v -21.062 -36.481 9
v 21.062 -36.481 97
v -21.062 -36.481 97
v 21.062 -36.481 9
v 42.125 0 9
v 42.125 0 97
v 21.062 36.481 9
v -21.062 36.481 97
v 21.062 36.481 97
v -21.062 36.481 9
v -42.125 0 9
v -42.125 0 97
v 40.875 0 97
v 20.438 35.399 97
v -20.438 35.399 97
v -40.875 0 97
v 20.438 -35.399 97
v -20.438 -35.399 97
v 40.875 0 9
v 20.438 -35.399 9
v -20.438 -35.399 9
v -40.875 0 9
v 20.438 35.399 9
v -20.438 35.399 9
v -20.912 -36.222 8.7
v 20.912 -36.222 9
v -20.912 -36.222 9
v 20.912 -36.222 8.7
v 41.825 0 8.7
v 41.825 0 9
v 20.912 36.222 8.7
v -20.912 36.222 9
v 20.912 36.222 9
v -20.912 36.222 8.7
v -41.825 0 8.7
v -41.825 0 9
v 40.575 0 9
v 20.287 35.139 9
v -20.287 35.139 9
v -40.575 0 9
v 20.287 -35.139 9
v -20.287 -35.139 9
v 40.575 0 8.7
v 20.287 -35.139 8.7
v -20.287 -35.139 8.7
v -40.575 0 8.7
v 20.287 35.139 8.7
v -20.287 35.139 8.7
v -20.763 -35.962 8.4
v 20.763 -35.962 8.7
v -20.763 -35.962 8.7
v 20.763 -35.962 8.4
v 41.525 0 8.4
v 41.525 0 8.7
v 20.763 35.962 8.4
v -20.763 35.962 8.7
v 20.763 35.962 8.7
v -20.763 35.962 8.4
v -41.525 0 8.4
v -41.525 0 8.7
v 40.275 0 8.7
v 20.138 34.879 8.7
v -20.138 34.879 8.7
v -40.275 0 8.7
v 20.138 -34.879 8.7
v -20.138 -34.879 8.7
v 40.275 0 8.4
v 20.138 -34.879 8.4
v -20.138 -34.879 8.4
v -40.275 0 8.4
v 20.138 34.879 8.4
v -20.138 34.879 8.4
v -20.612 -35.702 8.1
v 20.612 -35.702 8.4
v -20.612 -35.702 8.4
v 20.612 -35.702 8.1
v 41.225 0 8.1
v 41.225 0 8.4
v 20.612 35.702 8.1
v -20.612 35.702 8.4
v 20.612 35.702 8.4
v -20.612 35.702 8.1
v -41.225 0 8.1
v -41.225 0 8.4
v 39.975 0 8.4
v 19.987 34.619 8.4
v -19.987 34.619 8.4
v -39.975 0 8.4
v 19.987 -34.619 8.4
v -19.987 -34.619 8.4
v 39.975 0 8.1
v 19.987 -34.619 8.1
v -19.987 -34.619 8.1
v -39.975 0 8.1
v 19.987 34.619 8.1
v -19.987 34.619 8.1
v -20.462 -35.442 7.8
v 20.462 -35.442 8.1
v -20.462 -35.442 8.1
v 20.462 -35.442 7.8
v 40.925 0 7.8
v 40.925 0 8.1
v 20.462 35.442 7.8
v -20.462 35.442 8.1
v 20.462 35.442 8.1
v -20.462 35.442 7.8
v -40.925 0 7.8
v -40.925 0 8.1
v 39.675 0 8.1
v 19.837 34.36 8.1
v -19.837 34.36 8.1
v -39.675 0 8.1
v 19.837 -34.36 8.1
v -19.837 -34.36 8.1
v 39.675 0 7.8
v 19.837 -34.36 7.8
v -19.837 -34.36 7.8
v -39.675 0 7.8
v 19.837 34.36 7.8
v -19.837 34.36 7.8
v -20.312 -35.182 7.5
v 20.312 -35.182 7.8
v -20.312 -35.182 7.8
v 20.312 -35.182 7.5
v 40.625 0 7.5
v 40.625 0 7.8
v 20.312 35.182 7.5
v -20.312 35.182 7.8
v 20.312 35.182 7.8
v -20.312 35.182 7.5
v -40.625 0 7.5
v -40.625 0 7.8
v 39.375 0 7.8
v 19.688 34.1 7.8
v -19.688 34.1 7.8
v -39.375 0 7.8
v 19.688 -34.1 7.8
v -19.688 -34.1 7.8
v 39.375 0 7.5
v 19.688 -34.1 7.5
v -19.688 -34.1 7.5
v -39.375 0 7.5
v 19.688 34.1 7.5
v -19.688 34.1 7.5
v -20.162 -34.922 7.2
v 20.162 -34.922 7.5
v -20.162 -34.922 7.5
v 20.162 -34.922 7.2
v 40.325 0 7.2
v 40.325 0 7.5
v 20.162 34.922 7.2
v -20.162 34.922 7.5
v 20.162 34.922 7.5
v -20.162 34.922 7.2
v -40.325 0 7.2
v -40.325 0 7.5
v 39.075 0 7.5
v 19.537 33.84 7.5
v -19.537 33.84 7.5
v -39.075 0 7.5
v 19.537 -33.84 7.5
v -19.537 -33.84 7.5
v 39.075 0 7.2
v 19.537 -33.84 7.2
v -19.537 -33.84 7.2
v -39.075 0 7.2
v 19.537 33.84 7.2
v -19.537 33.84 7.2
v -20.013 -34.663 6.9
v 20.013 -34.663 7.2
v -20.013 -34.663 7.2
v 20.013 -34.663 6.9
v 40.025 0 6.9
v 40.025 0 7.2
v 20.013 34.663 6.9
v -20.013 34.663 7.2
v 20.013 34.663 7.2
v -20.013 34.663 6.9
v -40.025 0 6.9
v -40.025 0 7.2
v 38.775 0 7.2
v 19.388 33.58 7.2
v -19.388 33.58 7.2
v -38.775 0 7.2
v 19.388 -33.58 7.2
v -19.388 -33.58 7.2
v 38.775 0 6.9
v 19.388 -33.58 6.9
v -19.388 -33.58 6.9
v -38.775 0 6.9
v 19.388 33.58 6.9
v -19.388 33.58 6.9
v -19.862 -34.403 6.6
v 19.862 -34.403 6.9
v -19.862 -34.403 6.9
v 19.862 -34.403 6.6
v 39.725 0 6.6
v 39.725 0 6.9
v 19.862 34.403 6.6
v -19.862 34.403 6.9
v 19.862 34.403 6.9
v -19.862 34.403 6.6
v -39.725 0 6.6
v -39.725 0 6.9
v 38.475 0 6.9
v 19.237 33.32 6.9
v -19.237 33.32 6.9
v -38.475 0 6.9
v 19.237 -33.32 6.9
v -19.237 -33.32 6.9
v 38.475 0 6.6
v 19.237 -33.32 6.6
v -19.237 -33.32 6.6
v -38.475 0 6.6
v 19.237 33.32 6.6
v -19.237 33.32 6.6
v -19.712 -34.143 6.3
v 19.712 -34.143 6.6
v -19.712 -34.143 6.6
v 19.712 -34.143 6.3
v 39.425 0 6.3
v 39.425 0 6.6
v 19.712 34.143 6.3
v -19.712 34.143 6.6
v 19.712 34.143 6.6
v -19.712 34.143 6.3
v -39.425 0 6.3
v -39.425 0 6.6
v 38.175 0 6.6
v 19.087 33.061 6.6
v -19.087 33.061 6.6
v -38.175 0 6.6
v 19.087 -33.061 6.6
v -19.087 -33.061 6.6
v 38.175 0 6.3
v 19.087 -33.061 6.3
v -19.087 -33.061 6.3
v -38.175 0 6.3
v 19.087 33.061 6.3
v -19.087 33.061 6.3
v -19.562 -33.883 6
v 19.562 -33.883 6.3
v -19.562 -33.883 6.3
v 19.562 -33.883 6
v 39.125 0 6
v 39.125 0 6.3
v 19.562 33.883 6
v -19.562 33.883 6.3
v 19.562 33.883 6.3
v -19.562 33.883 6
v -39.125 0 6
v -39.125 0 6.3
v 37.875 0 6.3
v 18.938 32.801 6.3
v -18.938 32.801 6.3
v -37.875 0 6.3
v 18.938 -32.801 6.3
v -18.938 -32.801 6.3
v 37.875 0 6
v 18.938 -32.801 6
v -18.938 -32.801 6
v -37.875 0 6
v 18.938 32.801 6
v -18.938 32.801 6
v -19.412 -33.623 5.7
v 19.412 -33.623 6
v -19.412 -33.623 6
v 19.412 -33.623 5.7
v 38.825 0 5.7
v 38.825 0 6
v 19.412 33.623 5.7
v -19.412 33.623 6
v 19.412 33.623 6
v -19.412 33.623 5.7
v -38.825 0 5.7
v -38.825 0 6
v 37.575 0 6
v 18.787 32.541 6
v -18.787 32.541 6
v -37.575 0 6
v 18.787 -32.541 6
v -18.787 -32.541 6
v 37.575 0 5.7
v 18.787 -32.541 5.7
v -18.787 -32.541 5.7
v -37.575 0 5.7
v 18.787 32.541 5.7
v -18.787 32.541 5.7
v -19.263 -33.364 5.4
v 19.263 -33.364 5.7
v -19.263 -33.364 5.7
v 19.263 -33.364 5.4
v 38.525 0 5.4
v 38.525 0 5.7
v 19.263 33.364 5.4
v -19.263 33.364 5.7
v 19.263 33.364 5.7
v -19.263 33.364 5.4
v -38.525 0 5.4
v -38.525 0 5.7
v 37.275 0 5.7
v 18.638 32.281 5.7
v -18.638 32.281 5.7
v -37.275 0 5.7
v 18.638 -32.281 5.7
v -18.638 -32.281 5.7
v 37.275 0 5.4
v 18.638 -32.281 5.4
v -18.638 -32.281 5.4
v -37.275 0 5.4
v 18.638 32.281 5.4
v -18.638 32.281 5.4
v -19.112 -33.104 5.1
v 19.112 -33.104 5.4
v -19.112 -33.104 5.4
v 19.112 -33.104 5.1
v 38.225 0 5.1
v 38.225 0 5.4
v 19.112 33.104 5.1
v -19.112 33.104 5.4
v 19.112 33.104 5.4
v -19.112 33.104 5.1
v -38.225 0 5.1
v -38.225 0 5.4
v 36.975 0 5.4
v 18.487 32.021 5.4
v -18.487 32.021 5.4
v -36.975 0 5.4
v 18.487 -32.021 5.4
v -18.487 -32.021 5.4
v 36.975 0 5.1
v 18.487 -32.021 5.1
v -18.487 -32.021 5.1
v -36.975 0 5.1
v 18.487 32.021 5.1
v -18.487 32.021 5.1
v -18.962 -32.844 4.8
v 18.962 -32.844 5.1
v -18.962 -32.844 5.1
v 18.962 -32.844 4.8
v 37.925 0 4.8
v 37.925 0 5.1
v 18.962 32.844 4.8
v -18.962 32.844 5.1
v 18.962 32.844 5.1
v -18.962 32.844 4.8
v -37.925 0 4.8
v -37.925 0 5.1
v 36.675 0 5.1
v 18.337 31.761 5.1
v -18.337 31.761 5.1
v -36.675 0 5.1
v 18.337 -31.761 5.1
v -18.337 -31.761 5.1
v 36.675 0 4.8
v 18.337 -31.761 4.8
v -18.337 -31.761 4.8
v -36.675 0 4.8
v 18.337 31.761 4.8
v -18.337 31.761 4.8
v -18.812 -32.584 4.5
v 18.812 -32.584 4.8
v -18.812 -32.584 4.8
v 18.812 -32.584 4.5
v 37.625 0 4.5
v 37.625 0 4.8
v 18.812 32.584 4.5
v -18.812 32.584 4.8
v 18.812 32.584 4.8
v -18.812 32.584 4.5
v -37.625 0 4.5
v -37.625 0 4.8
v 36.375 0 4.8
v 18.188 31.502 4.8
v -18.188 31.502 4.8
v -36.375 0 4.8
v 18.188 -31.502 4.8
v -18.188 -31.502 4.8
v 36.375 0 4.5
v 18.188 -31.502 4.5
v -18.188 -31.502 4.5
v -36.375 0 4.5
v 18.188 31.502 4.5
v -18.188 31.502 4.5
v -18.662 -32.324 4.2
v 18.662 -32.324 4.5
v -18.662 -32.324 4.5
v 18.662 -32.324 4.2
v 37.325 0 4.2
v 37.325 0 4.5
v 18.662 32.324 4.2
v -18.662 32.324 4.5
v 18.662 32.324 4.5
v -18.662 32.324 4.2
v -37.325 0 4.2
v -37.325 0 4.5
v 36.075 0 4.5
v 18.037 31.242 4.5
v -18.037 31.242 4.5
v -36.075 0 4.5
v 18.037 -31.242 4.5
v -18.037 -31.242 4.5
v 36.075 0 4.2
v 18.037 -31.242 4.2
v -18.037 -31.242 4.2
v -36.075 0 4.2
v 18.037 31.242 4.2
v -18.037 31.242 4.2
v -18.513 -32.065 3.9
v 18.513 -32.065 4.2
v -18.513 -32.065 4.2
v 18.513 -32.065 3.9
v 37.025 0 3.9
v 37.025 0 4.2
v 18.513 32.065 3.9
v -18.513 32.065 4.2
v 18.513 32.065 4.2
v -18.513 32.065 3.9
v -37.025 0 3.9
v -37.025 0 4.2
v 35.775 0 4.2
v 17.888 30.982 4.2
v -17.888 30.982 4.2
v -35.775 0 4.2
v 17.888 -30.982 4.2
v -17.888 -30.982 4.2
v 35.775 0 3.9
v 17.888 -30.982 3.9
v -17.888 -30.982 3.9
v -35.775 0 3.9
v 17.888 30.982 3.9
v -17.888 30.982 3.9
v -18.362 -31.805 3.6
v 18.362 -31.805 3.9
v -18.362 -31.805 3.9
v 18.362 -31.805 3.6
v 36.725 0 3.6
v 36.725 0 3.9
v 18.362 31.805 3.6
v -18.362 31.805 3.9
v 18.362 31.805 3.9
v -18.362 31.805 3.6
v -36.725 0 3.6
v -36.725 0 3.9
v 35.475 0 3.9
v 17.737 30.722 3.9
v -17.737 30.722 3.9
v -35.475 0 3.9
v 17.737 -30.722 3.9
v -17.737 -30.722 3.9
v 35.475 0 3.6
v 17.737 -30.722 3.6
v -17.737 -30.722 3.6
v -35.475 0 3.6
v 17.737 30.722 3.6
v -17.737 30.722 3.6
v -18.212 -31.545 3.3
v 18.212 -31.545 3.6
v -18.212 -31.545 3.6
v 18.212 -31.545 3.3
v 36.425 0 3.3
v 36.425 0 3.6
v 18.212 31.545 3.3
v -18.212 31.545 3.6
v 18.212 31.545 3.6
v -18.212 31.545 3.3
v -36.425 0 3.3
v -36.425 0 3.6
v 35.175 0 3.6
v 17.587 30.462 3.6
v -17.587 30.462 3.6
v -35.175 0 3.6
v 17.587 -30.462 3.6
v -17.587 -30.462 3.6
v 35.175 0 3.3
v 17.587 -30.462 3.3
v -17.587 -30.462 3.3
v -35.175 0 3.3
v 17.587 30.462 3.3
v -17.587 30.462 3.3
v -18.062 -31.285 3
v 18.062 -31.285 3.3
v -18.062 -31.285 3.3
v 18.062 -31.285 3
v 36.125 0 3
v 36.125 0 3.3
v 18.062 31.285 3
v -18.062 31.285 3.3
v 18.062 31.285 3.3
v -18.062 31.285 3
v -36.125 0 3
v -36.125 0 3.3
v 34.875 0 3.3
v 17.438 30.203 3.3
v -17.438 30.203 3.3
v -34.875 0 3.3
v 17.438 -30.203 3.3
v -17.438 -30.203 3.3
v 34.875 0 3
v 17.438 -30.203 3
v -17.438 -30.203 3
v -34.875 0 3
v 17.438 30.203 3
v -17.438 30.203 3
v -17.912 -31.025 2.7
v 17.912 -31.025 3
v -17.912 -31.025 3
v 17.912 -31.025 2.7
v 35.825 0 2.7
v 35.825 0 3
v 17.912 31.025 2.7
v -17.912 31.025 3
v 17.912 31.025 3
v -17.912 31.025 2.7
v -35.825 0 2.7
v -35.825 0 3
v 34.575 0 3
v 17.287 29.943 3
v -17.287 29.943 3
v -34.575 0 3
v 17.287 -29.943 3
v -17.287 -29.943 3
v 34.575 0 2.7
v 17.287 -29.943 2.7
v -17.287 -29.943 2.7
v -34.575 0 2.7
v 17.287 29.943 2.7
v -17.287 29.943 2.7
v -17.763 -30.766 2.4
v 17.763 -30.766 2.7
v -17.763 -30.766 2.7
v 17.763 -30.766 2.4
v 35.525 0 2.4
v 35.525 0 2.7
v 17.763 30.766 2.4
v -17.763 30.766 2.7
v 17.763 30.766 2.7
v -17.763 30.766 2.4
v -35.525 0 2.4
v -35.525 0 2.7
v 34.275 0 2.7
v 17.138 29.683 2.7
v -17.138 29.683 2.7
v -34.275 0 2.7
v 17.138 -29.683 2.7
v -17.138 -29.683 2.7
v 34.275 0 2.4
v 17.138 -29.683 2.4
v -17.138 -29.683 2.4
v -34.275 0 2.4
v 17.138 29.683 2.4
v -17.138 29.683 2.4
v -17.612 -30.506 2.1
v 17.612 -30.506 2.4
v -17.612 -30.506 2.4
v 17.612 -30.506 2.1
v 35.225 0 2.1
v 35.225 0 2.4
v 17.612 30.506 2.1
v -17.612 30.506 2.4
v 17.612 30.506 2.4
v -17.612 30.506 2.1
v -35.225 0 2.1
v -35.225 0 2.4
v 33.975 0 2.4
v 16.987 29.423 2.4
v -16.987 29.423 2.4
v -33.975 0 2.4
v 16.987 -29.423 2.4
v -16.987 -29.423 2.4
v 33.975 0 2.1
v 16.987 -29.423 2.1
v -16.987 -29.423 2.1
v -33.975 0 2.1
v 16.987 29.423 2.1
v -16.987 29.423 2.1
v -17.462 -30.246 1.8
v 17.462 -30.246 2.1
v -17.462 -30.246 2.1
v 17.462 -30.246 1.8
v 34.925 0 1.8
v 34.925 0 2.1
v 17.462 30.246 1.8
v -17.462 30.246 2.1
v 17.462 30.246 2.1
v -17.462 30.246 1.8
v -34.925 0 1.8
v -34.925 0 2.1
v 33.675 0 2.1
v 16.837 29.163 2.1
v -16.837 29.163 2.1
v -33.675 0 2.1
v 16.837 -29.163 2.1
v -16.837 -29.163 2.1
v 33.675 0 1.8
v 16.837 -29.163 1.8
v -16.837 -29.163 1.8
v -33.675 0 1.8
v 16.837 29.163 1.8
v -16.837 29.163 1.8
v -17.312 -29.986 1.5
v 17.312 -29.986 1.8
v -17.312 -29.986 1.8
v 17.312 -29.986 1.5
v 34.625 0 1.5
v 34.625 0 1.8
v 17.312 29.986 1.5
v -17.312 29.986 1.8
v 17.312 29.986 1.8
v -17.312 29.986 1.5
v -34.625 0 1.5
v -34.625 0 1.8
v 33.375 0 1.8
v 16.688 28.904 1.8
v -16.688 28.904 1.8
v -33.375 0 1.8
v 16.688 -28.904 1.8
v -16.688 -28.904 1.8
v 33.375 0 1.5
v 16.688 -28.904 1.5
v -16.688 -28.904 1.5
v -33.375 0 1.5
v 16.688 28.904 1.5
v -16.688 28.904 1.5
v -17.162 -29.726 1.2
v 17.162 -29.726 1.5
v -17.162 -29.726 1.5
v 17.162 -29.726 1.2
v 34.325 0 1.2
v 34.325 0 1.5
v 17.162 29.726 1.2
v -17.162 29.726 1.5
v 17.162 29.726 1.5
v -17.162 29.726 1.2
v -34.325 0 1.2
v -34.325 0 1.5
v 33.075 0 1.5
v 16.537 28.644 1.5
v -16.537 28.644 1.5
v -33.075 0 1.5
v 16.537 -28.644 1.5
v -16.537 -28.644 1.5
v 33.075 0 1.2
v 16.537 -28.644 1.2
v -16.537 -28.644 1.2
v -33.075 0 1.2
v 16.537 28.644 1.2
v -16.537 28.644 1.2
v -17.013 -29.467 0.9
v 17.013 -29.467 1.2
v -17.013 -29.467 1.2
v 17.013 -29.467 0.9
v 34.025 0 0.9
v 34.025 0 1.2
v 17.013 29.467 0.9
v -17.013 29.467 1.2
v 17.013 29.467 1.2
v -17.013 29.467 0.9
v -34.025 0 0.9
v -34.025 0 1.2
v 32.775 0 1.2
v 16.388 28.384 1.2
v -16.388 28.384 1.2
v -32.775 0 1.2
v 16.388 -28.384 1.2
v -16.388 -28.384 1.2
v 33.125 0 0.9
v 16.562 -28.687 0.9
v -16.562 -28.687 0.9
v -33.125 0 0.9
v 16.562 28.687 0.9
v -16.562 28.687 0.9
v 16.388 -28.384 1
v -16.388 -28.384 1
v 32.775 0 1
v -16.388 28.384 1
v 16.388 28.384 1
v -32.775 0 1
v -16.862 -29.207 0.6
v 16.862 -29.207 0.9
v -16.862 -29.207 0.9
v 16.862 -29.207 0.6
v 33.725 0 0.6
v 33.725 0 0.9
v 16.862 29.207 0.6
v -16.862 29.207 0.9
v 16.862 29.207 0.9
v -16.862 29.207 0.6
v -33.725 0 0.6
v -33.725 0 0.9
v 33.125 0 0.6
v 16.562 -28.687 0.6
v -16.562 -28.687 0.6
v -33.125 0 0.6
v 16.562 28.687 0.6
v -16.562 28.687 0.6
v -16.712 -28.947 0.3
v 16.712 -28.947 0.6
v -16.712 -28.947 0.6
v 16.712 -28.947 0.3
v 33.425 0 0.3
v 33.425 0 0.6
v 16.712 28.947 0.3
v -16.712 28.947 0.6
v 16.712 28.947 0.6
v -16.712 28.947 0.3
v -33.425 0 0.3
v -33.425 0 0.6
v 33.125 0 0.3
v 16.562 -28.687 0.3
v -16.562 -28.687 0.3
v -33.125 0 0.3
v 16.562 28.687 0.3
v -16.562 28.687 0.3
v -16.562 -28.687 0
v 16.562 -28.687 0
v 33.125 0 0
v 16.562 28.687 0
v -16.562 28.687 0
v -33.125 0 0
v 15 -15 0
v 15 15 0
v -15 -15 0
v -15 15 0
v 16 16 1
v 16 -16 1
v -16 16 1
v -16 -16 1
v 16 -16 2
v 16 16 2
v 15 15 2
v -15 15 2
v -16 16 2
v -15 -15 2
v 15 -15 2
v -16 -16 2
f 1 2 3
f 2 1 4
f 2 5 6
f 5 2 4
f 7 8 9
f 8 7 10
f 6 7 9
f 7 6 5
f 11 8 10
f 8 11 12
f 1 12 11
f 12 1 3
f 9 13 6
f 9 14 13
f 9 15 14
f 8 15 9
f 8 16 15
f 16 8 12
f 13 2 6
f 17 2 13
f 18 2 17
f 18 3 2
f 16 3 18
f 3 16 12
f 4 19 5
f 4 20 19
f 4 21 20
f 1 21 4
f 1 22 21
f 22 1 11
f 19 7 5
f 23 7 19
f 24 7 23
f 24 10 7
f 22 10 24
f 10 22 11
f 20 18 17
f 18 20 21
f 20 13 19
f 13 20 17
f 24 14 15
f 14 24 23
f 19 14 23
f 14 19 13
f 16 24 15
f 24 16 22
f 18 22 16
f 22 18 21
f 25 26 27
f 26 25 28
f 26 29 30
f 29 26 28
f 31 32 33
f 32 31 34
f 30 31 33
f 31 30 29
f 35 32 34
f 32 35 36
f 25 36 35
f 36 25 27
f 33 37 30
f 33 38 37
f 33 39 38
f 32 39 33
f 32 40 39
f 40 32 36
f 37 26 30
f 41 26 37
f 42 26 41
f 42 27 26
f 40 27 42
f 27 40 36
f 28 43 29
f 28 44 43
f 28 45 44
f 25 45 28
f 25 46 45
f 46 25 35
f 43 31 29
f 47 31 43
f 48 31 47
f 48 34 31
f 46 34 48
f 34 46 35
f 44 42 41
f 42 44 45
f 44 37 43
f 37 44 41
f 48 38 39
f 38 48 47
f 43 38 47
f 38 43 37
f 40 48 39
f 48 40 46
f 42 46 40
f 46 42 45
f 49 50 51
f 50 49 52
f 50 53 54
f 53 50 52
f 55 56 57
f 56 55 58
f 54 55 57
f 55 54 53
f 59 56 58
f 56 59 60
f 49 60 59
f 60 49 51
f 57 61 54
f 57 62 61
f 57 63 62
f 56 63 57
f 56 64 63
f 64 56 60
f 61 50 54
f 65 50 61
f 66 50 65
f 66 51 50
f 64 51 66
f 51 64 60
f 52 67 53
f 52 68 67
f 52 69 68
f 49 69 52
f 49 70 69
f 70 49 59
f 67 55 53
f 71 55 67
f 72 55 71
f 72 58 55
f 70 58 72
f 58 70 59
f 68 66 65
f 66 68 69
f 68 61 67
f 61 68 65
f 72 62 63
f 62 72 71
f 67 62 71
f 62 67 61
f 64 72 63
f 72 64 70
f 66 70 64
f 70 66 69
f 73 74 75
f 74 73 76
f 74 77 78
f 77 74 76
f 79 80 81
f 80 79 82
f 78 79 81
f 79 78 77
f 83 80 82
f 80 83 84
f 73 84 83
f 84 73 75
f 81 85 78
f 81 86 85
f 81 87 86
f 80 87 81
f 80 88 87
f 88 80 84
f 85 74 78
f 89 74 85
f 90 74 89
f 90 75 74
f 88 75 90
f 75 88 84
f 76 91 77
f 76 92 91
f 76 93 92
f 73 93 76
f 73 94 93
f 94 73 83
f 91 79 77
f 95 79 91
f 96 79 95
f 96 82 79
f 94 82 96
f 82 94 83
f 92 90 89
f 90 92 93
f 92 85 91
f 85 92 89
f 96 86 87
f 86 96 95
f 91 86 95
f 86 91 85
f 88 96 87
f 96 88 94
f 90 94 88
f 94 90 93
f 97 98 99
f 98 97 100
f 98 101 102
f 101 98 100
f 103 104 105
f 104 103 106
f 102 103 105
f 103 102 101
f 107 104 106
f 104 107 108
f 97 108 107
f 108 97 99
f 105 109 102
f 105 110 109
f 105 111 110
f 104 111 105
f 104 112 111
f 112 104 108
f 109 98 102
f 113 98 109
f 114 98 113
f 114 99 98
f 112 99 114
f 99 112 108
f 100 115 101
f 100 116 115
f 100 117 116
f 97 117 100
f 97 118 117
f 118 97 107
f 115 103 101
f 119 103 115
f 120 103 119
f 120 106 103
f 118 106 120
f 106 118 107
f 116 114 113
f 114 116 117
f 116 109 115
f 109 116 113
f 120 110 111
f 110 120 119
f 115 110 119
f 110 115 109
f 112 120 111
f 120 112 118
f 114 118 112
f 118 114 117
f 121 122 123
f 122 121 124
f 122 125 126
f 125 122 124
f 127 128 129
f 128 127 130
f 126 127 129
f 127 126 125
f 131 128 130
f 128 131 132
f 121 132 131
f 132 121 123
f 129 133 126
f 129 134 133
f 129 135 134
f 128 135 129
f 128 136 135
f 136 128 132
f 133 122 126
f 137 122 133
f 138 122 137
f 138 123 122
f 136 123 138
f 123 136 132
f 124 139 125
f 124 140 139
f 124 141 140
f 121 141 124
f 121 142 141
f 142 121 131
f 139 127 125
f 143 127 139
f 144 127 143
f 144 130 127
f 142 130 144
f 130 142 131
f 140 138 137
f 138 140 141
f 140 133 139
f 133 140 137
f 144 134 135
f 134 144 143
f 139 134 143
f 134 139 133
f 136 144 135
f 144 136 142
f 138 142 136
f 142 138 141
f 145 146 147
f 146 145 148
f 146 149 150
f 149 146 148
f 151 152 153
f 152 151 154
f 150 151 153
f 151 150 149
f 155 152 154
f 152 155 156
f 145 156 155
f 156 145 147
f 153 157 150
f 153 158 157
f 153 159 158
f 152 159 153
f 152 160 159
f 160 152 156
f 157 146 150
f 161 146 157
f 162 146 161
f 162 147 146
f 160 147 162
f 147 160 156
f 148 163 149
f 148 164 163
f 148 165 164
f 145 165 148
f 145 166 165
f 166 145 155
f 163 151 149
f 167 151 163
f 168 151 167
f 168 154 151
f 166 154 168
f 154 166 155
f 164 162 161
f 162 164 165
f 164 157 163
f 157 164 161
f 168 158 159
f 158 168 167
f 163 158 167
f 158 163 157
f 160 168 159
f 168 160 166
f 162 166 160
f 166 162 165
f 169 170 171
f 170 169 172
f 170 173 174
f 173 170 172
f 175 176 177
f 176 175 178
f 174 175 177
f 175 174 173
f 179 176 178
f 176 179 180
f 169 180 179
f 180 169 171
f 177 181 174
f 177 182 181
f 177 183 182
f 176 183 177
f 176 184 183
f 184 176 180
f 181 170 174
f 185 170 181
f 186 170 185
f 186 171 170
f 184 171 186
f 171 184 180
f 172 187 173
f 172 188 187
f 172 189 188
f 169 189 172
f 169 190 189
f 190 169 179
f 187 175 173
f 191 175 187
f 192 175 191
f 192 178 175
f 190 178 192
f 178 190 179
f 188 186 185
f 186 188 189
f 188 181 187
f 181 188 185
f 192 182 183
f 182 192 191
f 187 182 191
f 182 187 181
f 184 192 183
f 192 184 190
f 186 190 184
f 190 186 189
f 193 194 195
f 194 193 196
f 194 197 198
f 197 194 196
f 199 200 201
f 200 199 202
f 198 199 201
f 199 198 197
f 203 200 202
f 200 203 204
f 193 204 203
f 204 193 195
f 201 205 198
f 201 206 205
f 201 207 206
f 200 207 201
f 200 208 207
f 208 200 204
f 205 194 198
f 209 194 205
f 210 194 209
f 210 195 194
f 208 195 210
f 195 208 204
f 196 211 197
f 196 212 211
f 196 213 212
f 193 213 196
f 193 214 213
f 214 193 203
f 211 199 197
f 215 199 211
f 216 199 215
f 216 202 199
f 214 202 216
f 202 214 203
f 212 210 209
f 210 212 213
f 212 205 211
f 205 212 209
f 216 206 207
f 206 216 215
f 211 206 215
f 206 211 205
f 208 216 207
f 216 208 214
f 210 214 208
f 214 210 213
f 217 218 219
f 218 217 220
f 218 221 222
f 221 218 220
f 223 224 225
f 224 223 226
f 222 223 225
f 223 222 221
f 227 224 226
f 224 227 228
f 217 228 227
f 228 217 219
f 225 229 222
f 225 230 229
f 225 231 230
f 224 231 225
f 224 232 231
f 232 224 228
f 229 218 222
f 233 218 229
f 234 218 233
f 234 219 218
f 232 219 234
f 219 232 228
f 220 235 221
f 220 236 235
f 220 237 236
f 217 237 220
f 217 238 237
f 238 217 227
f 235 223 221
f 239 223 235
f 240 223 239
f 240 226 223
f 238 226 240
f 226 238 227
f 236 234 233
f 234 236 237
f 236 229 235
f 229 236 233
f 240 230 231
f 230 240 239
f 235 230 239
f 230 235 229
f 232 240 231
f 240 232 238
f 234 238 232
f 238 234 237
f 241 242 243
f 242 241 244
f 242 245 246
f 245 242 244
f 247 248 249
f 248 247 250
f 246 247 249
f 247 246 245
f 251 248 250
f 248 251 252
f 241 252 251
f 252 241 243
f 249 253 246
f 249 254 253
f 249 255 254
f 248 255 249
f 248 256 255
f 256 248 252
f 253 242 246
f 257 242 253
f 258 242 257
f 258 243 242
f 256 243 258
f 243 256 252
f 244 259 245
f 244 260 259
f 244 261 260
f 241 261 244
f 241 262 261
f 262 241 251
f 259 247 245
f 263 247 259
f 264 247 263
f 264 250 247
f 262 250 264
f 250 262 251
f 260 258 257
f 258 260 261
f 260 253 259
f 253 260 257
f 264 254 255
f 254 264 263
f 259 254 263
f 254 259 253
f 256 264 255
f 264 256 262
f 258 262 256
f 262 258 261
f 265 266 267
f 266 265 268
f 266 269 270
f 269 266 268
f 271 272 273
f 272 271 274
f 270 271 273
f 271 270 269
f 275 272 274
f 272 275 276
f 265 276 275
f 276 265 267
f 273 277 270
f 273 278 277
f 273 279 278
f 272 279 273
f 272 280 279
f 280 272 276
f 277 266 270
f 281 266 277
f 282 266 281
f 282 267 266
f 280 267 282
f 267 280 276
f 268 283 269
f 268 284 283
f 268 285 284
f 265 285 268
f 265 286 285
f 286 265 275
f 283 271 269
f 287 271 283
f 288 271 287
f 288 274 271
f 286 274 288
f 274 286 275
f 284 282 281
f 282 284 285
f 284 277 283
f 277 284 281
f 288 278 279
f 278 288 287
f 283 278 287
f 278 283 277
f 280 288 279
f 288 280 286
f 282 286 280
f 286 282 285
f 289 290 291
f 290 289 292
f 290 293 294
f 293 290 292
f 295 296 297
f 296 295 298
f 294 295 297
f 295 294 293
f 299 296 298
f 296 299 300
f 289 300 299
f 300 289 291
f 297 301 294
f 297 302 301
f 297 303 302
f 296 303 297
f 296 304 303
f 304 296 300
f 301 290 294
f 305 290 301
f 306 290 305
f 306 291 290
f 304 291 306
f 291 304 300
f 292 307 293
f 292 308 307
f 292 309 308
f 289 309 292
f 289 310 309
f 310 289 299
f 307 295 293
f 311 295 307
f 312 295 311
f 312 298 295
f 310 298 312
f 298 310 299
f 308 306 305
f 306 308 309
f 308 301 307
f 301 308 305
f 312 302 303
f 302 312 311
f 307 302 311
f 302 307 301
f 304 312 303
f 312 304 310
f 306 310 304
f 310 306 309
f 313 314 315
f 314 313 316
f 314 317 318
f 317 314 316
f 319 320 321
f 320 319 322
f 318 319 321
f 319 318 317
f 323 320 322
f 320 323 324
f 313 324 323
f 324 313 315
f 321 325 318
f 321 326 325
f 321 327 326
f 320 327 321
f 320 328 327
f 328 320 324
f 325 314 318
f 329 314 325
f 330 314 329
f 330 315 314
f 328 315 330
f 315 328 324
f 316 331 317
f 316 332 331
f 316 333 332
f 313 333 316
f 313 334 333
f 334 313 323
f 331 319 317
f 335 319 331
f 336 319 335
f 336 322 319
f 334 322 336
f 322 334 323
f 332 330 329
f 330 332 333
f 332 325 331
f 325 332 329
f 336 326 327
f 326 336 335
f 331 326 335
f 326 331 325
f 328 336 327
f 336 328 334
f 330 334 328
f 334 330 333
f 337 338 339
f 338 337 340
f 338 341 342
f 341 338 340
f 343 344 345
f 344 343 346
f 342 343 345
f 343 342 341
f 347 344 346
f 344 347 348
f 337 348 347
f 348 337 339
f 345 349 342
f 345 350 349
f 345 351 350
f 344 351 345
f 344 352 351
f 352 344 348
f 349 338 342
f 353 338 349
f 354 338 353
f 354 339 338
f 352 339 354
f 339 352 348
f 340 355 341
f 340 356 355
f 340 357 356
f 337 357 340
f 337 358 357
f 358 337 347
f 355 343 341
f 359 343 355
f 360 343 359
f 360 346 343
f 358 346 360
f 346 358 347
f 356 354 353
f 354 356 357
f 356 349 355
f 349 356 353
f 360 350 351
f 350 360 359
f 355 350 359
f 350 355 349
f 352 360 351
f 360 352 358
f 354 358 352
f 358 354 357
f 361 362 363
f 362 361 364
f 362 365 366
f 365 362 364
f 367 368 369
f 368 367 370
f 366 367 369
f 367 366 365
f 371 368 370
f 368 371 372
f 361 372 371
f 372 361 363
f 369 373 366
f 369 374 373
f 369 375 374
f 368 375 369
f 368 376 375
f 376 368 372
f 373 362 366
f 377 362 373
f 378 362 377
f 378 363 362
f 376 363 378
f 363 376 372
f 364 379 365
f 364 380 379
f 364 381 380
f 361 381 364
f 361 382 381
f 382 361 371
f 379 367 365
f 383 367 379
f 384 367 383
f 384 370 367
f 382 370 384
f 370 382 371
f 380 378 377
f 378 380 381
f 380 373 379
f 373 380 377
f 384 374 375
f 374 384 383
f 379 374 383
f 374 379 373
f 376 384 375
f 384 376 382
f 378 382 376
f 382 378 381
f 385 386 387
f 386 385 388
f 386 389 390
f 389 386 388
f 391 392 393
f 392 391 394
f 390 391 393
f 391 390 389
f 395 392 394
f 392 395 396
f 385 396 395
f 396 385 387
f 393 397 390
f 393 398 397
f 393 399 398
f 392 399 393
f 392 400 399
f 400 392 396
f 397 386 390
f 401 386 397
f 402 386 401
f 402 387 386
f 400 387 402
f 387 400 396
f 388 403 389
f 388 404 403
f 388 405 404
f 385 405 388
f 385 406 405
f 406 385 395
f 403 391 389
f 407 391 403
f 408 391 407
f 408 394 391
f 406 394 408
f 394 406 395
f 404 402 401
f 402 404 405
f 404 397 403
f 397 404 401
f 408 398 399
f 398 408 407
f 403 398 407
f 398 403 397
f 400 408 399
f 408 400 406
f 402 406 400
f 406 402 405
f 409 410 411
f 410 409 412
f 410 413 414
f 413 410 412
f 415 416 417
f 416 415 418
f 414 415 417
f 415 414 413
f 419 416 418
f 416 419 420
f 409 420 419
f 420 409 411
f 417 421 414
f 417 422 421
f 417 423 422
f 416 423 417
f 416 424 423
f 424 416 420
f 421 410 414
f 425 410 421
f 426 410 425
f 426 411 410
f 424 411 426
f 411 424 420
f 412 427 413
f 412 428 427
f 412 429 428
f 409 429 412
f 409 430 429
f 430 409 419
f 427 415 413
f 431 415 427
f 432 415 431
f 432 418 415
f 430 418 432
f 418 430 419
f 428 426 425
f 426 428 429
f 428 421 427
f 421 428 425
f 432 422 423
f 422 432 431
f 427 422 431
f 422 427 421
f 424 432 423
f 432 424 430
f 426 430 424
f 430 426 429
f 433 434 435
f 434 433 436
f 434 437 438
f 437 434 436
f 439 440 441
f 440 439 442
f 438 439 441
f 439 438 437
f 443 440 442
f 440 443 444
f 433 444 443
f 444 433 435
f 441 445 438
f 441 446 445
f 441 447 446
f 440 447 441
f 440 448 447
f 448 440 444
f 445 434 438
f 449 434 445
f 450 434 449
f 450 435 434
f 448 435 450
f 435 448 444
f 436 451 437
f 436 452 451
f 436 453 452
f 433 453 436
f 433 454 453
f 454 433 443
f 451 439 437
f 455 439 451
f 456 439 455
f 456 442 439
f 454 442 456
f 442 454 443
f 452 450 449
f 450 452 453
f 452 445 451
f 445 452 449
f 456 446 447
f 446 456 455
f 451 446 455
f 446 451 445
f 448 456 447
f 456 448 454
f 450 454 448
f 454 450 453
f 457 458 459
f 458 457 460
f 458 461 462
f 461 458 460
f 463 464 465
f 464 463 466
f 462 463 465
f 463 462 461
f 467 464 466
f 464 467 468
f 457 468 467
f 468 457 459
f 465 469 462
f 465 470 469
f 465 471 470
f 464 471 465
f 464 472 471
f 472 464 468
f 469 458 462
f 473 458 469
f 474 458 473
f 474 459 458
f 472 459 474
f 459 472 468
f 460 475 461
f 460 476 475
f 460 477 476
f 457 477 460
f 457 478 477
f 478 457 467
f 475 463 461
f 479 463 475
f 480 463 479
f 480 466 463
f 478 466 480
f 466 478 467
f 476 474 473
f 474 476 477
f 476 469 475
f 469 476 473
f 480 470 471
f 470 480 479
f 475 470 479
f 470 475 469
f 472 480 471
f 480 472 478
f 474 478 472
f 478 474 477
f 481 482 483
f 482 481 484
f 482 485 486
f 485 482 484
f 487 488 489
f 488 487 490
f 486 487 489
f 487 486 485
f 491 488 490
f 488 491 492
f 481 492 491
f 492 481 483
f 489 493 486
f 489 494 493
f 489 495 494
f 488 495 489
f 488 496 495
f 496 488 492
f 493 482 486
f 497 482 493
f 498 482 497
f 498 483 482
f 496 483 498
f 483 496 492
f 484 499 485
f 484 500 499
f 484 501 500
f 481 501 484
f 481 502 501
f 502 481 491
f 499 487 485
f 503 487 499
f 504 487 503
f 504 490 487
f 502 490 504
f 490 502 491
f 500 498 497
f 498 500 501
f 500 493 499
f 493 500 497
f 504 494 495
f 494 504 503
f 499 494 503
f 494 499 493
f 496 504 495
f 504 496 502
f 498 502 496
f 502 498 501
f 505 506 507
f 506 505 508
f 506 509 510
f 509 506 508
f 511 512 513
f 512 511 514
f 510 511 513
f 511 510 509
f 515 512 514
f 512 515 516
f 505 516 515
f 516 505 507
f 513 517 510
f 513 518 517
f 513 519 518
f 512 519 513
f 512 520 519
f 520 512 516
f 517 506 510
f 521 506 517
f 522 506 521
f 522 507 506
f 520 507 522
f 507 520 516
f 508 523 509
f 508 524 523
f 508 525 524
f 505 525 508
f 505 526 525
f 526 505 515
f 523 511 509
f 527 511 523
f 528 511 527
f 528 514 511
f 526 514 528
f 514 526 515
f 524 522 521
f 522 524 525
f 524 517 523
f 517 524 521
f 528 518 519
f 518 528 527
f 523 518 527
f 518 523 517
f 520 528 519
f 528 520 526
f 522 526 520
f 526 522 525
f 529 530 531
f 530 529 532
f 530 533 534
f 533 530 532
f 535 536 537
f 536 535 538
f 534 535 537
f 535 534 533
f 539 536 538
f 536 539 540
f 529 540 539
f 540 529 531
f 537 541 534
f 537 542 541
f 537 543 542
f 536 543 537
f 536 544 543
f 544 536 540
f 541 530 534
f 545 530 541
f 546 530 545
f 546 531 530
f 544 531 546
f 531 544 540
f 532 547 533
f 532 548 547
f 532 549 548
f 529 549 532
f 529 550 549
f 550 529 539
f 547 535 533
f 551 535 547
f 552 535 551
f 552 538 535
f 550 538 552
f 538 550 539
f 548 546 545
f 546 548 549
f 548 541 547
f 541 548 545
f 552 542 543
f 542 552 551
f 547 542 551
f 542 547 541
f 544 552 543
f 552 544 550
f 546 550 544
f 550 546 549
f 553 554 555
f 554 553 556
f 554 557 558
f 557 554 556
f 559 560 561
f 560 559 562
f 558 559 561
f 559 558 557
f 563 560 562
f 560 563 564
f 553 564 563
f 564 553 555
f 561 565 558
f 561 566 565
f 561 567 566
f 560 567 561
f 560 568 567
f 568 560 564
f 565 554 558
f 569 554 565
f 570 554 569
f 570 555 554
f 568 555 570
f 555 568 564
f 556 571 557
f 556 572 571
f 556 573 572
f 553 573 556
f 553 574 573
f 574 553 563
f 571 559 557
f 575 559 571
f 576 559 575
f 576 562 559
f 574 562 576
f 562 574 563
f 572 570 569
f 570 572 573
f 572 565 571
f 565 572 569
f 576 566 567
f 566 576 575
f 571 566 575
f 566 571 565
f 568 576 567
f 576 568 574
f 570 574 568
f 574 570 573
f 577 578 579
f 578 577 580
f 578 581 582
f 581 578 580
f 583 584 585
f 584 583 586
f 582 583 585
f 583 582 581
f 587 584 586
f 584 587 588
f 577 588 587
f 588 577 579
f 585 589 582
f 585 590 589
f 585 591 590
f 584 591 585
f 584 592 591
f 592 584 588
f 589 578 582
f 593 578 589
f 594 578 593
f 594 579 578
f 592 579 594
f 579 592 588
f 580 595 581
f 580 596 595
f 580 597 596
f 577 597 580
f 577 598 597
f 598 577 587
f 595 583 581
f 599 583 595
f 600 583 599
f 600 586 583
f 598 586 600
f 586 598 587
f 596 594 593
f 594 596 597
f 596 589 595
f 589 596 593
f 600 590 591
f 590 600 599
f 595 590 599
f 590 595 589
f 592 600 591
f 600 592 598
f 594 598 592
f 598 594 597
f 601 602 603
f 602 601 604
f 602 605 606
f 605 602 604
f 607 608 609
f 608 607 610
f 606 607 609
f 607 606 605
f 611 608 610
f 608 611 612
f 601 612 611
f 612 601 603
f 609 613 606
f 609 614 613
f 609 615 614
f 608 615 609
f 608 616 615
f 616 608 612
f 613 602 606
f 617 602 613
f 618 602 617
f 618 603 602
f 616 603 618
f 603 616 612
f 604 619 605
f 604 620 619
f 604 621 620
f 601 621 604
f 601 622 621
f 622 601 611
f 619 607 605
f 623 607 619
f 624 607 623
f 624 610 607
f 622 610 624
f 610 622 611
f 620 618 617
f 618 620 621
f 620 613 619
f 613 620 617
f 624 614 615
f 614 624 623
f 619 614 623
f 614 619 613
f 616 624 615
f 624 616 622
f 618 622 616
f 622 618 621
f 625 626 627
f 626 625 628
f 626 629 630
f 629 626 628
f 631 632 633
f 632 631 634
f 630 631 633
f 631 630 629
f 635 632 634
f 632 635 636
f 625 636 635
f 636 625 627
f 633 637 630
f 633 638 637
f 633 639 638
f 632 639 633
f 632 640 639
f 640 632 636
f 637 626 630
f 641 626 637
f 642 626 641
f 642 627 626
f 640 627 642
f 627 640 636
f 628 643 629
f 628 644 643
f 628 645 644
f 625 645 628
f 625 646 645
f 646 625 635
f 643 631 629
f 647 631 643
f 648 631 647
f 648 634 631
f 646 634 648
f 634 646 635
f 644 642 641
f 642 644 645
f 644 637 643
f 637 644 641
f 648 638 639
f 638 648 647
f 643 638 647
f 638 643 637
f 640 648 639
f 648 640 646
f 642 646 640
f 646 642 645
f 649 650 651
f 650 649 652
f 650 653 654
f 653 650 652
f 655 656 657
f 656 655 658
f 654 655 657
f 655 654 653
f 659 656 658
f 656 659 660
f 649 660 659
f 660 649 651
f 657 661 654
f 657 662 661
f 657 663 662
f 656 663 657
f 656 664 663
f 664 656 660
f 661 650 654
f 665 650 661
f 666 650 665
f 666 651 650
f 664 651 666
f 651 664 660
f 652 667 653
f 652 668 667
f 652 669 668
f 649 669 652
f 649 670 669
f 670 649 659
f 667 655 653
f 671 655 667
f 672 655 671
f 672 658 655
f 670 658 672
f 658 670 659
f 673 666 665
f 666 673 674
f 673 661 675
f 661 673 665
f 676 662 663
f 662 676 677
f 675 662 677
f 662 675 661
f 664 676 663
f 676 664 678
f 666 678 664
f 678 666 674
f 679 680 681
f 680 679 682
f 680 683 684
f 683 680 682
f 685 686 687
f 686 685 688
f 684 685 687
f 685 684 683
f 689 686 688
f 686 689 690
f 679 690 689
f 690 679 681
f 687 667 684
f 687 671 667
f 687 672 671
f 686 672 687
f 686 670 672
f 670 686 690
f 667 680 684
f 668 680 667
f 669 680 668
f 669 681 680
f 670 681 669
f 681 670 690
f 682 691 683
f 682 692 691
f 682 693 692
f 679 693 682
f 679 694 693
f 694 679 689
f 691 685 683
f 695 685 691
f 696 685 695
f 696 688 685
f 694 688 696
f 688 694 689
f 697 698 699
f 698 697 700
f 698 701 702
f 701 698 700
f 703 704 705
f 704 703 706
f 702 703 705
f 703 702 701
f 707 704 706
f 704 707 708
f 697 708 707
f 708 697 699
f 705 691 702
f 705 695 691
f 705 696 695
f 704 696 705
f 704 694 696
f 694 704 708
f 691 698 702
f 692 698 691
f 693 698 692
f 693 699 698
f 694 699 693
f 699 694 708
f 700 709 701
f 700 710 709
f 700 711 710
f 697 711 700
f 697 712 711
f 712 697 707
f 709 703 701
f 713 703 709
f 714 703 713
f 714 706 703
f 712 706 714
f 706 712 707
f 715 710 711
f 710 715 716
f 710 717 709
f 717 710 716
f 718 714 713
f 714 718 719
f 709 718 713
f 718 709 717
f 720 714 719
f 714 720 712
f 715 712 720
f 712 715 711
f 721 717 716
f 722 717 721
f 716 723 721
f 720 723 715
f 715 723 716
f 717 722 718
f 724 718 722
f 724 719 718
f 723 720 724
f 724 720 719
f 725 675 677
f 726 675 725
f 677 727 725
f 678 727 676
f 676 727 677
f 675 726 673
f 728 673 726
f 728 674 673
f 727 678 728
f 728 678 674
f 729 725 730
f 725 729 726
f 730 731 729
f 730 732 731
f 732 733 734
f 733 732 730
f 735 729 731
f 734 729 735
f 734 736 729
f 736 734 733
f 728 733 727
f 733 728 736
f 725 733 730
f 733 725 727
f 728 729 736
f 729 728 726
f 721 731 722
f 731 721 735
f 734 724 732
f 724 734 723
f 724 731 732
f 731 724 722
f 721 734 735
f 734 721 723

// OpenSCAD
scale=.75;
d=115 * scale;
h=120 * scale;
bh=12 * scale;
gap=1;
thick=1.25;
b_thick=1;
extruder=0.3;
reduction=0.6;

D=d-gap*2;

union() {
    translate([0,0,bh]) difference() {
        cylinder(d=D, h=h-gap*2, $fn=6);
        cylinder(d=D-thick*2, h = h - gap*2, $fn=6);
    }
    for (i = [extruder:extruder:bh]) translate([0,0,bh-i]) difference() {
        cylinder(d=D-i/extruder*reduction, h=extruder, $fn=6);
        cylinder(d=D-i/extruder*reduction-thick*2, h = extruder, $fn=6);
    }
    difference() {
        union() {
            cylinder(d=D-bh/extruder*reduction, h=b_thick, $fn=6);
            translate([0, 0, 1]) cube(size=[32, 32, 2], center=true);
        }
        translate([0,0,1]) cube(size=[30,30,2], center=true);
    }
}
